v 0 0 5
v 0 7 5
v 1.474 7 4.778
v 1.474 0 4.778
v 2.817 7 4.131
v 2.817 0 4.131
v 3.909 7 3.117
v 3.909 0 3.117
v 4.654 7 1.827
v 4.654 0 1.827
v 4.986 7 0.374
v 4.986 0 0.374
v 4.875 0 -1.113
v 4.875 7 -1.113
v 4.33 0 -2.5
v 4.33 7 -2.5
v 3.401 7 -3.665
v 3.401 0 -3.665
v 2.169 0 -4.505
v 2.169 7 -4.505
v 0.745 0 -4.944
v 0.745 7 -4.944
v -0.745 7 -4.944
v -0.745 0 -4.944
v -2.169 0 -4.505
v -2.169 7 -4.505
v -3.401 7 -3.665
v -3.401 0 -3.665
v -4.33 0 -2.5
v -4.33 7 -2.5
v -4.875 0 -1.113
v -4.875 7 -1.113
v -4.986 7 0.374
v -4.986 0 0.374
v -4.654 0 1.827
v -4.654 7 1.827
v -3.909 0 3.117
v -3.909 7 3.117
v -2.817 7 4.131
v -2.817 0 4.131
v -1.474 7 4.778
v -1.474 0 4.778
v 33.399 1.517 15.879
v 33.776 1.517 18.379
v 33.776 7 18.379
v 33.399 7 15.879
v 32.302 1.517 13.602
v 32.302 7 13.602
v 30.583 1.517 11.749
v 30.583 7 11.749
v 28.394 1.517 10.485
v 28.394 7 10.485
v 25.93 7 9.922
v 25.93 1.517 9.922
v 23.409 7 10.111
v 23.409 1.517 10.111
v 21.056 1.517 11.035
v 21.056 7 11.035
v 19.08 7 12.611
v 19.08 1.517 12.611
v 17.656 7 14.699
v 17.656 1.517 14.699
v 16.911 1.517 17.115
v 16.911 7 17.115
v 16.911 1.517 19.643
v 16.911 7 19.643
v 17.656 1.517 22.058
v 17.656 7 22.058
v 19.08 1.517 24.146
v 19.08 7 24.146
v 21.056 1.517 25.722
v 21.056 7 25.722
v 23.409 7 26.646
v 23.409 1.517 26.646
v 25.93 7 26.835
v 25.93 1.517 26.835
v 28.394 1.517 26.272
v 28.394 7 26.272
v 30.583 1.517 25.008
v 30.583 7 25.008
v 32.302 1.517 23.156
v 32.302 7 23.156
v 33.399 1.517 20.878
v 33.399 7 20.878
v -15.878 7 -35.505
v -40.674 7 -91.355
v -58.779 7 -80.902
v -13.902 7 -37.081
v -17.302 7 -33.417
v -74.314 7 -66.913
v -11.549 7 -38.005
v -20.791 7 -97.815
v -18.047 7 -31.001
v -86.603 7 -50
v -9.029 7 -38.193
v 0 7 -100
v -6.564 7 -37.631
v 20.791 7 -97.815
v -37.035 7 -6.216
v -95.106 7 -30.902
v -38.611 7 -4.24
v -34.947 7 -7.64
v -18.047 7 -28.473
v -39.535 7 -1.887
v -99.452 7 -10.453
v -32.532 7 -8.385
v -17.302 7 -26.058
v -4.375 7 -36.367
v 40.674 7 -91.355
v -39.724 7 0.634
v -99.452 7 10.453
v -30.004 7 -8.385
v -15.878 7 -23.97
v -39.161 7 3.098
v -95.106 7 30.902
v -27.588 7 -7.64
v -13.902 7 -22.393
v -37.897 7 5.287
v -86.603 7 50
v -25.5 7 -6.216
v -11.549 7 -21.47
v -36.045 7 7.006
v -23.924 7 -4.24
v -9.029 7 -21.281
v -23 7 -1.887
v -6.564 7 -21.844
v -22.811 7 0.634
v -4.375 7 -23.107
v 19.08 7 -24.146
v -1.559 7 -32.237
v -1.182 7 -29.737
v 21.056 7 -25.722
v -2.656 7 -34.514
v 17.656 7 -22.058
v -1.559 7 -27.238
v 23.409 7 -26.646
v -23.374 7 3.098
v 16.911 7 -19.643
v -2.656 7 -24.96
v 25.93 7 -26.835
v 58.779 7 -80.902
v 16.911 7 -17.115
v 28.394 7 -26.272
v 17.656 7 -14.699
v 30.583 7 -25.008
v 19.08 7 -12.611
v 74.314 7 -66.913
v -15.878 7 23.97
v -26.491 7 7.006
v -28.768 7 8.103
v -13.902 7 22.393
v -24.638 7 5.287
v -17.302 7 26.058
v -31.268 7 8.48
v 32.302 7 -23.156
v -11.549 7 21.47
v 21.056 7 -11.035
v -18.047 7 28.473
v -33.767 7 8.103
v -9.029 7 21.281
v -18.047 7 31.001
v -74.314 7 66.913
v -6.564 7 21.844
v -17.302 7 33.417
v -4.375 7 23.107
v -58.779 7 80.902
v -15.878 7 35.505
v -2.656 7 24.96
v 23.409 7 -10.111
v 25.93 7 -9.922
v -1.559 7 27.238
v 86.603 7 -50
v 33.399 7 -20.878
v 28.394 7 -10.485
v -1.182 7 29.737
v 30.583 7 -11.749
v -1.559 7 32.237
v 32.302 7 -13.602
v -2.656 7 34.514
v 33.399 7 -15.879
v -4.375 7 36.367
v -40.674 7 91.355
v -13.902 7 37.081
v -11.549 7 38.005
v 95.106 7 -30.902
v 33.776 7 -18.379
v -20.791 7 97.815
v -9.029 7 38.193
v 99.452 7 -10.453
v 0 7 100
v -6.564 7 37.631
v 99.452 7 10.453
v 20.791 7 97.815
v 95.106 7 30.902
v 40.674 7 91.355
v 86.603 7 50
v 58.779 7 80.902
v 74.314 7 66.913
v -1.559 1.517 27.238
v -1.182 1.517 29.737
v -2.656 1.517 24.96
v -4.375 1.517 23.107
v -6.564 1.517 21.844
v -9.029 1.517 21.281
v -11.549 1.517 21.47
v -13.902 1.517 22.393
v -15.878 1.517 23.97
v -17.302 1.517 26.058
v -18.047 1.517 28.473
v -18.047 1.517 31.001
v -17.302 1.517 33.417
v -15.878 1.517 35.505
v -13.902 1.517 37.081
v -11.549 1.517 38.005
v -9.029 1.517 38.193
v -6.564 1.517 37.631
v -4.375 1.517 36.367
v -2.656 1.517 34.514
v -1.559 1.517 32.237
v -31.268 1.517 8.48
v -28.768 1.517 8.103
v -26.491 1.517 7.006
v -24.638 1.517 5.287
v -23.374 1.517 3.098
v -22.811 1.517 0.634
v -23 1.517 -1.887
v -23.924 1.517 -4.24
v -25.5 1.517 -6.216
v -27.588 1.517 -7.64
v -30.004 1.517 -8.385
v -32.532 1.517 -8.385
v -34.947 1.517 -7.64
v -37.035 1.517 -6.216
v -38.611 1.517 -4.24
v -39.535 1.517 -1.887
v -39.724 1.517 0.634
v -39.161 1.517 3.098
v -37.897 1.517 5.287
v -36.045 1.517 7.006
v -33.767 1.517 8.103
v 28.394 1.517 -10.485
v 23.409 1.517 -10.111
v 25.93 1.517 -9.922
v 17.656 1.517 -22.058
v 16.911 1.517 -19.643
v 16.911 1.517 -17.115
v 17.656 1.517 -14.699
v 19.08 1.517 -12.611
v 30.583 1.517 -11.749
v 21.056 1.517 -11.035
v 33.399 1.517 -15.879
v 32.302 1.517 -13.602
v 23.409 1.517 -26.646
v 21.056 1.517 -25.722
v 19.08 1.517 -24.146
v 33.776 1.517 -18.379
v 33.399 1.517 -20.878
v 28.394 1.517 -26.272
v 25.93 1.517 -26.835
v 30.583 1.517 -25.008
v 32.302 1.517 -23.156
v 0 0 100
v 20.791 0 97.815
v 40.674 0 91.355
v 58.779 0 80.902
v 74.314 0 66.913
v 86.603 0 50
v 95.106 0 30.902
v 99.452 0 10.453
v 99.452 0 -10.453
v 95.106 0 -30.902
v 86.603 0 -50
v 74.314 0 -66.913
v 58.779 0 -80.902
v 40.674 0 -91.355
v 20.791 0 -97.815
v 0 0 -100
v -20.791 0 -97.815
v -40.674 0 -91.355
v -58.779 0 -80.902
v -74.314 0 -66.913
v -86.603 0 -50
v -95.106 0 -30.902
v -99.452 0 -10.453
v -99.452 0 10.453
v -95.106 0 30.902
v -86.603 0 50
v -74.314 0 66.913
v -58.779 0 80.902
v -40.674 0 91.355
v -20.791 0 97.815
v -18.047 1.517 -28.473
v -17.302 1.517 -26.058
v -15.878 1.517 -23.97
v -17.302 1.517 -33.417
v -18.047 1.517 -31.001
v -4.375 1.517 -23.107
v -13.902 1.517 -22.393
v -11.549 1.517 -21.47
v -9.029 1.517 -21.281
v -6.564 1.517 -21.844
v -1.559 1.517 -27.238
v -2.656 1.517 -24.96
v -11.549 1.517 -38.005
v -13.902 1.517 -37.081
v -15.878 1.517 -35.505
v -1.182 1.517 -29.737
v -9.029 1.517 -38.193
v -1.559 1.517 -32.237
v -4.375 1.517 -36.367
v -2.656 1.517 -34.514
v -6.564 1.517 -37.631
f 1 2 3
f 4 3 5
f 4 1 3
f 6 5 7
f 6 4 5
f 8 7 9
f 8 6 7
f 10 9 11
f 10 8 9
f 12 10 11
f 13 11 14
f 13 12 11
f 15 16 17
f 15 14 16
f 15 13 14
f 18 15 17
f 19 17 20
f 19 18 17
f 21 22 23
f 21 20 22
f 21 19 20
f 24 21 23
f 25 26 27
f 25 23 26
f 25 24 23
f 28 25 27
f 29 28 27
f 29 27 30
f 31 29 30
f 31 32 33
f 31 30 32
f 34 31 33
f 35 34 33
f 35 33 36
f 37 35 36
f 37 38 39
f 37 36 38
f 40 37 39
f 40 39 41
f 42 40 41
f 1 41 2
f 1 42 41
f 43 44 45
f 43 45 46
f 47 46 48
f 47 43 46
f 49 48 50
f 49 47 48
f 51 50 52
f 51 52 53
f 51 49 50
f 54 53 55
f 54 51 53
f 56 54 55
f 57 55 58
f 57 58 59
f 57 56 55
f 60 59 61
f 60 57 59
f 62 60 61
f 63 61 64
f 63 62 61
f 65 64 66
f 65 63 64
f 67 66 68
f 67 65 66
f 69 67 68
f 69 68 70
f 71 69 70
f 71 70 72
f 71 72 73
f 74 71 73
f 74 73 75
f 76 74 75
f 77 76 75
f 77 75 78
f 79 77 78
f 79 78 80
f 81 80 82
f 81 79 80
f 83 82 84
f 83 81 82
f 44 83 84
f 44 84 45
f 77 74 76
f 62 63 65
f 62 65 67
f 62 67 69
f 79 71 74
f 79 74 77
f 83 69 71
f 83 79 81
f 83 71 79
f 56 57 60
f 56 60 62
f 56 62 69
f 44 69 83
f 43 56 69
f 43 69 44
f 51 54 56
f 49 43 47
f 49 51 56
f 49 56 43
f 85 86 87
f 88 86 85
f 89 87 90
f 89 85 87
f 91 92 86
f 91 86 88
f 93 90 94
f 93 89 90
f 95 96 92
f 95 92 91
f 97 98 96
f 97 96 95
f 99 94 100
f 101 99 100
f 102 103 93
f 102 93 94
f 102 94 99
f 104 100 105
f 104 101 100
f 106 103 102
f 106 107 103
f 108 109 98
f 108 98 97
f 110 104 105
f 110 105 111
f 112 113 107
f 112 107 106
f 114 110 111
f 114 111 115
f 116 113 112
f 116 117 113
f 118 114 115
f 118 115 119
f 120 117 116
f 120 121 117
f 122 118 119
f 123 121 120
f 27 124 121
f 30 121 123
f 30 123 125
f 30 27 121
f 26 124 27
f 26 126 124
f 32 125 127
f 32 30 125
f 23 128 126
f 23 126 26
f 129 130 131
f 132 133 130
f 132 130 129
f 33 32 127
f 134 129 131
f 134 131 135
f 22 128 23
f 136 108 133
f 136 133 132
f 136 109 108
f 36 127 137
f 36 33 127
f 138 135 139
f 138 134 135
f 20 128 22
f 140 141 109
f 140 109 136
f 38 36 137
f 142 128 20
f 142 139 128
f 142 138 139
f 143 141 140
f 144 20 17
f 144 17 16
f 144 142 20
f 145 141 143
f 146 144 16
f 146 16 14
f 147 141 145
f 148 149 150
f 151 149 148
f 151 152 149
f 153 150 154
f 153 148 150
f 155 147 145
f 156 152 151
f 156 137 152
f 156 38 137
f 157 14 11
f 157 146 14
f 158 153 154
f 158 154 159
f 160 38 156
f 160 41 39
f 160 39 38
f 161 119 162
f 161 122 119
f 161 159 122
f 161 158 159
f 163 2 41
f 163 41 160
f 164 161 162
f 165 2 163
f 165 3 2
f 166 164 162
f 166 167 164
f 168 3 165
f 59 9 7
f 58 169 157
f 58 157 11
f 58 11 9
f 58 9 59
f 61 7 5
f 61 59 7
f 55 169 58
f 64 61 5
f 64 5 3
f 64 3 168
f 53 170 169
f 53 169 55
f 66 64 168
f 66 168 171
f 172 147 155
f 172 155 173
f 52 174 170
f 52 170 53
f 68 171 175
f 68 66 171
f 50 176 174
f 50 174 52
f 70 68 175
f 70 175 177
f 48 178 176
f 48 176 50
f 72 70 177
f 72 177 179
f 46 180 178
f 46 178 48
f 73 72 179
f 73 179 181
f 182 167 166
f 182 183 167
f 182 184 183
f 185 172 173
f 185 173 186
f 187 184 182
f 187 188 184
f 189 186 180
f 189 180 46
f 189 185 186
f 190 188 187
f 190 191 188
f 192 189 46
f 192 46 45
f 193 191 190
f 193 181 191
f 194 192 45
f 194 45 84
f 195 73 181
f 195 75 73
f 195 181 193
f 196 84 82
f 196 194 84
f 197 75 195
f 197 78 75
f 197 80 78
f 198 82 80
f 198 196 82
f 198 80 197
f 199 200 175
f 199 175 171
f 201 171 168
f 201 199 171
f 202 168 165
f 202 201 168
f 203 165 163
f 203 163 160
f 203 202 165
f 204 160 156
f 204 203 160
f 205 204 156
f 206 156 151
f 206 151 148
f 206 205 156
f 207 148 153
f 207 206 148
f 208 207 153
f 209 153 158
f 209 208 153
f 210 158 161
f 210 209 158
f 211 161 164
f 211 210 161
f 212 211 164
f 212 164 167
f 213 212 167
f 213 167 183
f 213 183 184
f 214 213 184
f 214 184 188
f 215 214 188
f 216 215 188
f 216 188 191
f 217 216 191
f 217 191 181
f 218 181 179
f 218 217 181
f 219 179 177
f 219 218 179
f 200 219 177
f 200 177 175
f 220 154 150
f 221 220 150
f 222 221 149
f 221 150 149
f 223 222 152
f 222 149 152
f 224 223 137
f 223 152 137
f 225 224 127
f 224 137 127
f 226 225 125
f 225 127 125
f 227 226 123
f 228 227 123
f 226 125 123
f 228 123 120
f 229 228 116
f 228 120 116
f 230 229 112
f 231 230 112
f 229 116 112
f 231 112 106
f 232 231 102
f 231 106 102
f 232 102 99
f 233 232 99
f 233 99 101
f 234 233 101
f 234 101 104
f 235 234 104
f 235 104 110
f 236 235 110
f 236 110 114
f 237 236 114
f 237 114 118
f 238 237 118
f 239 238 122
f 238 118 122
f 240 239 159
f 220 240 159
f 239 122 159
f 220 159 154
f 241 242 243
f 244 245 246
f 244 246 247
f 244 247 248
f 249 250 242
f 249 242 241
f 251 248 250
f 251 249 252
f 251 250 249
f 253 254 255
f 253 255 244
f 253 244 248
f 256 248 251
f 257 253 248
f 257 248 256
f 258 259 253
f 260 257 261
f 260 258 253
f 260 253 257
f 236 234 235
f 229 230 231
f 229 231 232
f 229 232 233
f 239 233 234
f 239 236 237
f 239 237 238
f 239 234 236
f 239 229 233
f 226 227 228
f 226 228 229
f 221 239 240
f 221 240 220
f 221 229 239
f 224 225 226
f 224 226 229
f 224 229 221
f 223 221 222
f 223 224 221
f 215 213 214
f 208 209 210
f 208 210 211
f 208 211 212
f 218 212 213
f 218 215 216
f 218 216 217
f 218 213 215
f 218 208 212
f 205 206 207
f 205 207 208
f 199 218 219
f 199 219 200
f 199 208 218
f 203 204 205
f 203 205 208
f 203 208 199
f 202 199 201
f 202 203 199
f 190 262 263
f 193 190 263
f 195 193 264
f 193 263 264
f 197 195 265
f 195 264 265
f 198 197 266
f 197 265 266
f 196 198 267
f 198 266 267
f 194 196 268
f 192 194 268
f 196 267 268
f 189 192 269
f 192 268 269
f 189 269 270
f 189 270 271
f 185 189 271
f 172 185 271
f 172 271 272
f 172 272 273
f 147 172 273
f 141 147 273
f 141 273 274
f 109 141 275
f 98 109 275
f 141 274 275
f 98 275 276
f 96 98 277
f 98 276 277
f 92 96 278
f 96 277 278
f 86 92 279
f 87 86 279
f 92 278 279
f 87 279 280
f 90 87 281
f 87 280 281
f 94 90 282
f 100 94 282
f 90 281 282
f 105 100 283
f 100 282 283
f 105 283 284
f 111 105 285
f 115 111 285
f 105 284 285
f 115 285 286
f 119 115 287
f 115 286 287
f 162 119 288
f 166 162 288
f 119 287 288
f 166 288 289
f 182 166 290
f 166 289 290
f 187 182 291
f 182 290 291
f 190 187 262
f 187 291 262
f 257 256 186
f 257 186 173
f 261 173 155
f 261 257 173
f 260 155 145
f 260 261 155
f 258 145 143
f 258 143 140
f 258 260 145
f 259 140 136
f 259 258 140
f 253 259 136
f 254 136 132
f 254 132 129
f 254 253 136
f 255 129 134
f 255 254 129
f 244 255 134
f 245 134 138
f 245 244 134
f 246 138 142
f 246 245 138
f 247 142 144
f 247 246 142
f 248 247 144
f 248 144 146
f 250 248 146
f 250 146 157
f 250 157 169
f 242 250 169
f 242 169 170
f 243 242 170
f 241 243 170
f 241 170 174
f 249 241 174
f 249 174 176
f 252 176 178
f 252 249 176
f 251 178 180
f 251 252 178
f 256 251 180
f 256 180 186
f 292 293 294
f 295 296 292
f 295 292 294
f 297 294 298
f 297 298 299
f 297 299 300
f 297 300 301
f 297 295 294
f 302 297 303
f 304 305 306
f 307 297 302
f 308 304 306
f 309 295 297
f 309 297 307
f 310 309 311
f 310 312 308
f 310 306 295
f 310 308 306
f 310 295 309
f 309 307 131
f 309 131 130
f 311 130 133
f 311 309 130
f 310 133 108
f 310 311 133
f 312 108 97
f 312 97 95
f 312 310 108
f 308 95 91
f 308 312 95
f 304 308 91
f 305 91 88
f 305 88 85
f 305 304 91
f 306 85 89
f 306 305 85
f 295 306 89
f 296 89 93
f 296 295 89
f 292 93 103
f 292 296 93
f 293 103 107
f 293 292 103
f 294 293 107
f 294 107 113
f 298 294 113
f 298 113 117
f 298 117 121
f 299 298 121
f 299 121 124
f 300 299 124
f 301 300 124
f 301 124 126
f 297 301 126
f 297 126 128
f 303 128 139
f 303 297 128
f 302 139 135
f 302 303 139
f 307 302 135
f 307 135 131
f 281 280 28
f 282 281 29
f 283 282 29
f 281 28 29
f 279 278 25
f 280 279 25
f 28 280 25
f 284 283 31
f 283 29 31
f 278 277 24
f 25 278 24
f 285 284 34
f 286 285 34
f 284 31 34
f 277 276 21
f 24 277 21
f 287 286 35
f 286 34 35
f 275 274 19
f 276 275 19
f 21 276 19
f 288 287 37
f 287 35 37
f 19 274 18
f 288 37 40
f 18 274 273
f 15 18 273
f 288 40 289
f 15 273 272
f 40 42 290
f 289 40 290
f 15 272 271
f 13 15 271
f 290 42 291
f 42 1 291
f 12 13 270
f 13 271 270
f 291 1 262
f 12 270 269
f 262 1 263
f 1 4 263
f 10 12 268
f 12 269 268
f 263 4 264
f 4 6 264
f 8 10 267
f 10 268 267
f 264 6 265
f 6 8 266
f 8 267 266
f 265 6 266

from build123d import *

# Parameters (mm, degrees)
SKETCH1_R           = 100
BOSS_EXTRUDE1_DEPTH = 7
SKETCH2_R           = 5
CUT_EXTRUDE1_DEPTH  = 142.594491418
SKETCH3_R           = 8.479886046
CUT_EXTRUDE2_DEPTH  = 5.482683901
CIRPATTERN1_COUNT   = 5


with BuildPart() as part:
    # Sketch1 → Boss-Extrude1 (new body)
    with BuildSketch(Plane(origin=(0, 0, 0), x_dir=(1, 0, 0), z_dir=(0, 1, 0))):
        Circle(SKETCH1_R)
    extrude(amount=BOSS_EXTRUDE1_DEPTH)

    # Sketch2 → Cut-Extrude1 (cut, through all)
    with BuildSketch(Plane(origin=(0, 0, 0), x_dir=(1, 0, 0), z_dir=(0, 1, 0))):
        Circle(SKETCH2_R)
    extrude(amount=CUT_EXTRUDE1_DEPTH, mode=Mode.SUBTRACT)

    # Sketch3 → Cut-Extrude2 (cut)
    with BuildSketch(Plane(origin=(0, 7, 0), x_dir=(1, 0, 0), z_dir=(0, 1, 0))):
        with Locations((-31.267640686, 0)):
            Circle(SKETCH3_R)
    cut_extrude2 = extrude(amount=-CUT_EXTRUDE2_DEPTH, mode=Mode.SUBTRACT)

    # CirPattern1: Cut-Extrude2 ×5 about axis
    cirpattern1_axis = Axis((0, 0, 0), (0, 1, 0))
    for i in range(1, CIRPATTERN1_COUNT):
        add(cut_extrude2.rotate(cirpattern1_axis, i * 360 / CIRPATTERN1_COUNT), mode=Mode.SUBTRACT)


solid = part.part
